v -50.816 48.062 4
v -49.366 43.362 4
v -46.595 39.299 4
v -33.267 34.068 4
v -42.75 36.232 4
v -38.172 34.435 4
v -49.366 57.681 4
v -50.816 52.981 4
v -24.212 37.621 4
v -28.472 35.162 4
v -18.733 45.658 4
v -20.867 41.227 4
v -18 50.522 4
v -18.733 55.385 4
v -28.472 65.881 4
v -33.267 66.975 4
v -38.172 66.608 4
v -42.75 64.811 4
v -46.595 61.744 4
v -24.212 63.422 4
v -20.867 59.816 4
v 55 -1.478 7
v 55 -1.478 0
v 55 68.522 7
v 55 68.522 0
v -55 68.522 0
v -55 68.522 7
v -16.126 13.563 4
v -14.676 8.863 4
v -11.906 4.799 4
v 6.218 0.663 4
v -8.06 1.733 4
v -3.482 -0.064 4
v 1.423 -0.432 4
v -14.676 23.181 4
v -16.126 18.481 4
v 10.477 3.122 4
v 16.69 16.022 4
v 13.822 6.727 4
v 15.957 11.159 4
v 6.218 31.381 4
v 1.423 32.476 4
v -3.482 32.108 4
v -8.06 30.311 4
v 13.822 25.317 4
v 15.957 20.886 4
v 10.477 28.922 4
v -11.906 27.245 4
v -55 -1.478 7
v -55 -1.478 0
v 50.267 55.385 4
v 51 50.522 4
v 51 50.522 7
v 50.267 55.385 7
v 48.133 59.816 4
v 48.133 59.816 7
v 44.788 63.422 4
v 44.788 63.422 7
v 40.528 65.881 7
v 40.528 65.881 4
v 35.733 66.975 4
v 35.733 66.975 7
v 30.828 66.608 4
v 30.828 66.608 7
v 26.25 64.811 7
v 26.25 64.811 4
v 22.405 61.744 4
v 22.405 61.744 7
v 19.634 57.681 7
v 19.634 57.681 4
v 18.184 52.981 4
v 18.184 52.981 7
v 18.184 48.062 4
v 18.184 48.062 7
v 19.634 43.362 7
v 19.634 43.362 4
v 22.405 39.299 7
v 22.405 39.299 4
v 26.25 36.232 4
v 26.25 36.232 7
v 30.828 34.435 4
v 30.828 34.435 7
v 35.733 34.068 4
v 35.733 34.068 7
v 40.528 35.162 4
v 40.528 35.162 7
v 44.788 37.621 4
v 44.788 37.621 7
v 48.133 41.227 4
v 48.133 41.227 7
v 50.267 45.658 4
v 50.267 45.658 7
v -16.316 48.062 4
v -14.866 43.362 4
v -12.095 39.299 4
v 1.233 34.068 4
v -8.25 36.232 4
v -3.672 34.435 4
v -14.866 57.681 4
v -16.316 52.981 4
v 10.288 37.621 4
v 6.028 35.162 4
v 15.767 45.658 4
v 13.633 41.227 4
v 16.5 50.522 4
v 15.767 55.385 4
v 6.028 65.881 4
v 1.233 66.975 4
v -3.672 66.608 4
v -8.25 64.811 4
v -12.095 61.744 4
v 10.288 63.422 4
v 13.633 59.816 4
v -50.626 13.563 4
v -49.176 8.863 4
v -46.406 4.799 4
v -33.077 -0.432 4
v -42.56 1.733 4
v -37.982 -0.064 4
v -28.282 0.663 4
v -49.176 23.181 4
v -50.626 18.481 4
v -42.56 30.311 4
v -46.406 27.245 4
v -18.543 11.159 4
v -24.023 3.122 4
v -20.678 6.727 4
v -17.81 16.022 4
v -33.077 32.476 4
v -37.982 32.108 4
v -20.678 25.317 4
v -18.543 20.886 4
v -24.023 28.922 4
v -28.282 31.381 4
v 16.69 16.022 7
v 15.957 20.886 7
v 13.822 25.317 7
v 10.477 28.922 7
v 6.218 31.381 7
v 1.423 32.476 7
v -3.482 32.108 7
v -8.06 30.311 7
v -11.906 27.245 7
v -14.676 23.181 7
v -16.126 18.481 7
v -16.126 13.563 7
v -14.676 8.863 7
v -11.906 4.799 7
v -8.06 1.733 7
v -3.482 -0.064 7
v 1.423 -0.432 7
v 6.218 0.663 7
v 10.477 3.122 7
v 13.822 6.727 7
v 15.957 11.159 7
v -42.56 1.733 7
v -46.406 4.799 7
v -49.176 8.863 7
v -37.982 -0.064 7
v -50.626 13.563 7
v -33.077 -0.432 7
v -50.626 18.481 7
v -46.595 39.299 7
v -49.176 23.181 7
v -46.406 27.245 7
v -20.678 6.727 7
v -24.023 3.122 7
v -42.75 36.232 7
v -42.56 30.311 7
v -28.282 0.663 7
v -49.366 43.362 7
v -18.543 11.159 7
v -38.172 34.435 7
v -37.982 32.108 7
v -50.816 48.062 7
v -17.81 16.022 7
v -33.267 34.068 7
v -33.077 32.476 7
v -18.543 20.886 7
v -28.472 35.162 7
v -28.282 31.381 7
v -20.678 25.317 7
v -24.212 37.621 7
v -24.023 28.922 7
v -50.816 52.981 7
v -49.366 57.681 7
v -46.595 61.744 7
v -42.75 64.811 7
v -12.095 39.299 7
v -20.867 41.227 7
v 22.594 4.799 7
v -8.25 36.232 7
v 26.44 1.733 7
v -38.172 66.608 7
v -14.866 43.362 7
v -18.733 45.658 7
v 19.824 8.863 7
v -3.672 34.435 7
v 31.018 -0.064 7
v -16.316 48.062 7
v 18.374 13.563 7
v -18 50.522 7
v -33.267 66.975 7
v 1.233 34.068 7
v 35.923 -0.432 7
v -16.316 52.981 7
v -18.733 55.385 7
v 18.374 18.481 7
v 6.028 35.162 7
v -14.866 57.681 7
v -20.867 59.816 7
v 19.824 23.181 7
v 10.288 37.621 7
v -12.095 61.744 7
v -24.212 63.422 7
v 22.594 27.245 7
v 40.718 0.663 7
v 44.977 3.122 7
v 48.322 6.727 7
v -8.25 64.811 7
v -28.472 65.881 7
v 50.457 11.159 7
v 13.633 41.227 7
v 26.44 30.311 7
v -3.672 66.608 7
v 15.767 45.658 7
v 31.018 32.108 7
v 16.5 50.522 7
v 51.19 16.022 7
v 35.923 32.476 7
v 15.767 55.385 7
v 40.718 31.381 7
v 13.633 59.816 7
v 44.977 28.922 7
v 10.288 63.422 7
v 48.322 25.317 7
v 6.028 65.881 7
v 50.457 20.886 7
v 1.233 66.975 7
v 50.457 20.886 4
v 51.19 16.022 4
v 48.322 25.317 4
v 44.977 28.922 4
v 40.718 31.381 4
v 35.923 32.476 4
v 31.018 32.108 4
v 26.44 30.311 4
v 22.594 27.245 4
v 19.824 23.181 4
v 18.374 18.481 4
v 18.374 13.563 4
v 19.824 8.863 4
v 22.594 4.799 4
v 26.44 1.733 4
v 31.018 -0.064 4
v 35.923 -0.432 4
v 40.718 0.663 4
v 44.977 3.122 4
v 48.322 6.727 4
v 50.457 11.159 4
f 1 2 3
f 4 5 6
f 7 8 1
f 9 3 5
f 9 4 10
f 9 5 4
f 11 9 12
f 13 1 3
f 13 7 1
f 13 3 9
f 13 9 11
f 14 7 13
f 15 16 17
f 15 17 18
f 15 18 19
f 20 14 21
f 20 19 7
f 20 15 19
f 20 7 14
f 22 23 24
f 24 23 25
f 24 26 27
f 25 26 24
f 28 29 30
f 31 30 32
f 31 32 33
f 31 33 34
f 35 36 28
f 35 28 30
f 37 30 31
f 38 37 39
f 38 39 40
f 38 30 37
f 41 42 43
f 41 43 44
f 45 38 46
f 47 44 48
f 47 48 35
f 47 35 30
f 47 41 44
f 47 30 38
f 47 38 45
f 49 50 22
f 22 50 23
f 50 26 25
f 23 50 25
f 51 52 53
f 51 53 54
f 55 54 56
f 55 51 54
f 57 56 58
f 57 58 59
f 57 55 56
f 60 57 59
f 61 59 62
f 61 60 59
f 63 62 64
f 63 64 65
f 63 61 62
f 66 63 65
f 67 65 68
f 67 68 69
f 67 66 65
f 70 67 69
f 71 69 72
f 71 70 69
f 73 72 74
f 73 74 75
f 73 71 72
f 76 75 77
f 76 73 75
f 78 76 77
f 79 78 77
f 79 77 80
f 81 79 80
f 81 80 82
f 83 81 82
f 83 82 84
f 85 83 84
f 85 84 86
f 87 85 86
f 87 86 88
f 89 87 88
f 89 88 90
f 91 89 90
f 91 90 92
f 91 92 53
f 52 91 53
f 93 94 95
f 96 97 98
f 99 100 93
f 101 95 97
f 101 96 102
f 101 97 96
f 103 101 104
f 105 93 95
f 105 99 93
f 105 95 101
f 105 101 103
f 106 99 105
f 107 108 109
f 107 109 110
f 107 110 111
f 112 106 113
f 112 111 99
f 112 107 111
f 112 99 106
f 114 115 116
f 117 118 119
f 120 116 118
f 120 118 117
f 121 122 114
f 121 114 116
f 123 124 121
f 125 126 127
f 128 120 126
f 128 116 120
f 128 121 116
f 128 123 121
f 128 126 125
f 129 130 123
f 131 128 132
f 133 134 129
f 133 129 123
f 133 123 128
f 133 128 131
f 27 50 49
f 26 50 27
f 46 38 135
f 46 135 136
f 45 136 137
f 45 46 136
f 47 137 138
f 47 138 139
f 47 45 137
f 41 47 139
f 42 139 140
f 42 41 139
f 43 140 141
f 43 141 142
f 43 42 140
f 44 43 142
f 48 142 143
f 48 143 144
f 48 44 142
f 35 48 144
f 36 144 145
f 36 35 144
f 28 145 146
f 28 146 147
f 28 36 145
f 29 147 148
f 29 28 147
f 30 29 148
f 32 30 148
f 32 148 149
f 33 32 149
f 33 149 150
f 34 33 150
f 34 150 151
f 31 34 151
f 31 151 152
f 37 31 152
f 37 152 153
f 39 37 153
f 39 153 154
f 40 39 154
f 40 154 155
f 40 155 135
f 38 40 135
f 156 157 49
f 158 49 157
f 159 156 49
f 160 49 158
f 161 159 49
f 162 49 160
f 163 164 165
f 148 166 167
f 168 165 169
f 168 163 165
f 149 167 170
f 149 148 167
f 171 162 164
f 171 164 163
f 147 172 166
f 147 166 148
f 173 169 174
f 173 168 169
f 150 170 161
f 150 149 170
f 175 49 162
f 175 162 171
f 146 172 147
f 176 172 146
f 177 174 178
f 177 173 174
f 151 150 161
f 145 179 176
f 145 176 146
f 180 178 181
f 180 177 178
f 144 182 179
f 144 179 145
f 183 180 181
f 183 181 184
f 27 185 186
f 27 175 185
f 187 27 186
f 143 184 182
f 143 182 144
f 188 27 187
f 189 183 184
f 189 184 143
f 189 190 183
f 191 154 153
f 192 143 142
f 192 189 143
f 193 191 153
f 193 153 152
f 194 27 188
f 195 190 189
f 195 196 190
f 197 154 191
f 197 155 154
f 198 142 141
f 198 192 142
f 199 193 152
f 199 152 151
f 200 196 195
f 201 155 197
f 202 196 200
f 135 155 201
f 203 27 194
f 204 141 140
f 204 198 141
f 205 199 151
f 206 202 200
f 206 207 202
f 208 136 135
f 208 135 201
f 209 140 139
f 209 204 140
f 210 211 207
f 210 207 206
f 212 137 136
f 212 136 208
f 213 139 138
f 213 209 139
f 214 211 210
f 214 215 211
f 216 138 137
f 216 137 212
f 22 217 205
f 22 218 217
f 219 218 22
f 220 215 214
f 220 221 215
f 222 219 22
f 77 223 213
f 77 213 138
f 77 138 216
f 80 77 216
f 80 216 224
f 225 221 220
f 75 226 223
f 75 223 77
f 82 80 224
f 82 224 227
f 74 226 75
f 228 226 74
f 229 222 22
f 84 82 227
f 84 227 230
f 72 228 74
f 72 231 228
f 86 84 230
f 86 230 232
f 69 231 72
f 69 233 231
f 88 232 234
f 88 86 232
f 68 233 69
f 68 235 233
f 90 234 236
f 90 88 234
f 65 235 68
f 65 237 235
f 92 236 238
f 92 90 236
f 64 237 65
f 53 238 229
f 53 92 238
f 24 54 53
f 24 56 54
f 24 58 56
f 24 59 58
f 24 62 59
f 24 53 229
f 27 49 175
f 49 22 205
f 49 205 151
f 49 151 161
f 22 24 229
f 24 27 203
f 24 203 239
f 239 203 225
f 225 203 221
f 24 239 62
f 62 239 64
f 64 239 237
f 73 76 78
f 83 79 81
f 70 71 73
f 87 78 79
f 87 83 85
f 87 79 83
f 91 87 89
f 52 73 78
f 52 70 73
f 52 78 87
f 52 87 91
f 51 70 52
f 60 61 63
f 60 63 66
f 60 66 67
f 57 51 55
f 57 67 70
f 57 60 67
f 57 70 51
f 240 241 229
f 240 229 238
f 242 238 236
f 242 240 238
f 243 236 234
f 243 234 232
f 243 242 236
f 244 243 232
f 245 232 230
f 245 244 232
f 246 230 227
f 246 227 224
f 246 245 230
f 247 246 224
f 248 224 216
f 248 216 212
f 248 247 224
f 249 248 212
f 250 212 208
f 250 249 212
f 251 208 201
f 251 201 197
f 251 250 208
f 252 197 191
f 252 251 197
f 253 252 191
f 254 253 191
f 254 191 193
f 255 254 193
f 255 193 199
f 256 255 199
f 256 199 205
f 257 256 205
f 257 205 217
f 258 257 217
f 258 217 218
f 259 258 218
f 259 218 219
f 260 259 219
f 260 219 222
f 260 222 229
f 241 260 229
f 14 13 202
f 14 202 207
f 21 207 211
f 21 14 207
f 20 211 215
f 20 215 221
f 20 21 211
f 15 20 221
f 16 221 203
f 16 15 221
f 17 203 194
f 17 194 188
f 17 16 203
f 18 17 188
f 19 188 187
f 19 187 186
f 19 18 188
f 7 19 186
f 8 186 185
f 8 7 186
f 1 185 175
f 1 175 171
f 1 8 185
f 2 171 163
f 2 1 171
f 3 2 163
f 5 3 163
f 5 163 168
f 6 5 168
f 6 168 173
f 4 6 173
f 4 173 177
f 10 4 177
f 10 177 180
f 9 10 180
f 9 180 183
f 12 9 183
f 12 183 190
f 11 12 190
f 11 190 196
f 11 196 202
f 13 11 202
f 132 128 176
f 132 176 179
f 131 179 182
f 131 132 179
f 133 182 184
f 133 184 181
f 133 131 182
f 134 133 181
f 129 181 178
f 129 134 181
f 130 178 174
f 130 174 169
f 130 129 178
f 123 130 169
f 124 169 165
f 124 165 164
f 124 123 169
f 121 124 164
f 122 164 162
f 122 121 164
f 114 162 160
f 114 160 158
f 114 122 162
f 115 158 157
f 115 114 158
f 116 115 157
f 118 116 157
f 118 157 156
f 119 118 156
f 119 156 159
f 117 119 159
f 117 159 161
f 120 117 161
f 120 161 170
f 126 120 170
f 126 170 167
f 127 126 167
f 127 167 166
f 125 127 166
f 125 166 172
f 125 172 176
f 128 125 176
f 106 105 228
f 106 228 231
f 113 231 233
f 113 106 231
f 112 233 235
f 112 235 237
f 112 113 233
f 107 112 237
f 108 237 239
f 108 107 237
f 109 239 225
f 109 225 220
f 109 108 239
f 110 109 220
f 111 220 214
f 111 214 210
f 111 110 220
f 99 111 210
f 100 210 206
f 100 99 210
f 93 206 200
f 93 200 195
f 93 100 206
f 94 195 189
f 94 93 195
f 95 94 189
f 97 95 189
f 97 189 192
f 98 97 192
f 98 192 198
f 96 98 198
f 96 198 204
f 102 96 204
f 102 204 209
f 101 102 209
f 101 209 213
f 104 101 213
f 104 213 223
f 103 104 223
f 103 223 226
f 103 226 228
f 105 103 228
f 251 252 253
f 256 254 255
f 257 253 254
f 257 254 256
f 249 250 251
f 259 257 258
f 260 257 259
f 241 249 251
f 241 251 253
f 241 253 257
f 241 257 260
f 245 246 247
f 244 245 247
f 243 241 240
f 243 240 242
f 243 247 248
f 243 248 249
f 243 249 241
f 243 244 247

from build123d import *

# Parameters (mm, degrees)
F0_W     = 110
F0_H     = 70
F0_R     = 16.5
F1_DEPTH = 7
F2_DEPTH = 4


with BuildPart() as f1:
    # F0 (on Top) → F1 (new body)
    with BuildSketch(Plane.XY):
        with Locations((0, 33.521559)):
            Rectangle(F0_W, F0_H)
        with Locations((-34.310443, 16.02208)):
            Circle(F0_R, mode=Mode.SUBTRACT)
        with Locations((0.189557, 16.02208)):
            Circle(F0_R, mode=Mode.SUBTRACT)
        with Locations((34.689557, 16.02208)):
            Circle(F0_R, mode=Mode.SUBTRACT)
        with Locations((-34.5, 50.521559)):
            Circle(F0_R, mode=Mode.SUBTRACT)
        with Locations((0, 50.521559)):
            Circle(F0_R, mode=Mode.SUBTRACT)
        with Locations((34.5, 50.521559)):
            Circle(F0_R, mode=Mode.SUBTRACT)
    extrude(amount=F1_DEPTH)

    # F0 (on Top) → F2 (join)
    with BuildSketch(Plane.XY):
        with Locations((-34.5, 50.521559)):
            Circle(F0_R)
        with Locations((0, 50.521559)):
            Circle(F0_R)
        with Locations((34.5, 50.521559)):
            Circle(F0_R)
        with Locations((34.689557, 16.02208)):
            Circle(F0_R)
        with Locations((0.189557, 16.02208)):
            Circle(F0_R)
        with Locations((-34.310443, 16.02208)):
            Circle(F0_R)
    extrude(amount=F2_DEPTH)


solid = f1.part
